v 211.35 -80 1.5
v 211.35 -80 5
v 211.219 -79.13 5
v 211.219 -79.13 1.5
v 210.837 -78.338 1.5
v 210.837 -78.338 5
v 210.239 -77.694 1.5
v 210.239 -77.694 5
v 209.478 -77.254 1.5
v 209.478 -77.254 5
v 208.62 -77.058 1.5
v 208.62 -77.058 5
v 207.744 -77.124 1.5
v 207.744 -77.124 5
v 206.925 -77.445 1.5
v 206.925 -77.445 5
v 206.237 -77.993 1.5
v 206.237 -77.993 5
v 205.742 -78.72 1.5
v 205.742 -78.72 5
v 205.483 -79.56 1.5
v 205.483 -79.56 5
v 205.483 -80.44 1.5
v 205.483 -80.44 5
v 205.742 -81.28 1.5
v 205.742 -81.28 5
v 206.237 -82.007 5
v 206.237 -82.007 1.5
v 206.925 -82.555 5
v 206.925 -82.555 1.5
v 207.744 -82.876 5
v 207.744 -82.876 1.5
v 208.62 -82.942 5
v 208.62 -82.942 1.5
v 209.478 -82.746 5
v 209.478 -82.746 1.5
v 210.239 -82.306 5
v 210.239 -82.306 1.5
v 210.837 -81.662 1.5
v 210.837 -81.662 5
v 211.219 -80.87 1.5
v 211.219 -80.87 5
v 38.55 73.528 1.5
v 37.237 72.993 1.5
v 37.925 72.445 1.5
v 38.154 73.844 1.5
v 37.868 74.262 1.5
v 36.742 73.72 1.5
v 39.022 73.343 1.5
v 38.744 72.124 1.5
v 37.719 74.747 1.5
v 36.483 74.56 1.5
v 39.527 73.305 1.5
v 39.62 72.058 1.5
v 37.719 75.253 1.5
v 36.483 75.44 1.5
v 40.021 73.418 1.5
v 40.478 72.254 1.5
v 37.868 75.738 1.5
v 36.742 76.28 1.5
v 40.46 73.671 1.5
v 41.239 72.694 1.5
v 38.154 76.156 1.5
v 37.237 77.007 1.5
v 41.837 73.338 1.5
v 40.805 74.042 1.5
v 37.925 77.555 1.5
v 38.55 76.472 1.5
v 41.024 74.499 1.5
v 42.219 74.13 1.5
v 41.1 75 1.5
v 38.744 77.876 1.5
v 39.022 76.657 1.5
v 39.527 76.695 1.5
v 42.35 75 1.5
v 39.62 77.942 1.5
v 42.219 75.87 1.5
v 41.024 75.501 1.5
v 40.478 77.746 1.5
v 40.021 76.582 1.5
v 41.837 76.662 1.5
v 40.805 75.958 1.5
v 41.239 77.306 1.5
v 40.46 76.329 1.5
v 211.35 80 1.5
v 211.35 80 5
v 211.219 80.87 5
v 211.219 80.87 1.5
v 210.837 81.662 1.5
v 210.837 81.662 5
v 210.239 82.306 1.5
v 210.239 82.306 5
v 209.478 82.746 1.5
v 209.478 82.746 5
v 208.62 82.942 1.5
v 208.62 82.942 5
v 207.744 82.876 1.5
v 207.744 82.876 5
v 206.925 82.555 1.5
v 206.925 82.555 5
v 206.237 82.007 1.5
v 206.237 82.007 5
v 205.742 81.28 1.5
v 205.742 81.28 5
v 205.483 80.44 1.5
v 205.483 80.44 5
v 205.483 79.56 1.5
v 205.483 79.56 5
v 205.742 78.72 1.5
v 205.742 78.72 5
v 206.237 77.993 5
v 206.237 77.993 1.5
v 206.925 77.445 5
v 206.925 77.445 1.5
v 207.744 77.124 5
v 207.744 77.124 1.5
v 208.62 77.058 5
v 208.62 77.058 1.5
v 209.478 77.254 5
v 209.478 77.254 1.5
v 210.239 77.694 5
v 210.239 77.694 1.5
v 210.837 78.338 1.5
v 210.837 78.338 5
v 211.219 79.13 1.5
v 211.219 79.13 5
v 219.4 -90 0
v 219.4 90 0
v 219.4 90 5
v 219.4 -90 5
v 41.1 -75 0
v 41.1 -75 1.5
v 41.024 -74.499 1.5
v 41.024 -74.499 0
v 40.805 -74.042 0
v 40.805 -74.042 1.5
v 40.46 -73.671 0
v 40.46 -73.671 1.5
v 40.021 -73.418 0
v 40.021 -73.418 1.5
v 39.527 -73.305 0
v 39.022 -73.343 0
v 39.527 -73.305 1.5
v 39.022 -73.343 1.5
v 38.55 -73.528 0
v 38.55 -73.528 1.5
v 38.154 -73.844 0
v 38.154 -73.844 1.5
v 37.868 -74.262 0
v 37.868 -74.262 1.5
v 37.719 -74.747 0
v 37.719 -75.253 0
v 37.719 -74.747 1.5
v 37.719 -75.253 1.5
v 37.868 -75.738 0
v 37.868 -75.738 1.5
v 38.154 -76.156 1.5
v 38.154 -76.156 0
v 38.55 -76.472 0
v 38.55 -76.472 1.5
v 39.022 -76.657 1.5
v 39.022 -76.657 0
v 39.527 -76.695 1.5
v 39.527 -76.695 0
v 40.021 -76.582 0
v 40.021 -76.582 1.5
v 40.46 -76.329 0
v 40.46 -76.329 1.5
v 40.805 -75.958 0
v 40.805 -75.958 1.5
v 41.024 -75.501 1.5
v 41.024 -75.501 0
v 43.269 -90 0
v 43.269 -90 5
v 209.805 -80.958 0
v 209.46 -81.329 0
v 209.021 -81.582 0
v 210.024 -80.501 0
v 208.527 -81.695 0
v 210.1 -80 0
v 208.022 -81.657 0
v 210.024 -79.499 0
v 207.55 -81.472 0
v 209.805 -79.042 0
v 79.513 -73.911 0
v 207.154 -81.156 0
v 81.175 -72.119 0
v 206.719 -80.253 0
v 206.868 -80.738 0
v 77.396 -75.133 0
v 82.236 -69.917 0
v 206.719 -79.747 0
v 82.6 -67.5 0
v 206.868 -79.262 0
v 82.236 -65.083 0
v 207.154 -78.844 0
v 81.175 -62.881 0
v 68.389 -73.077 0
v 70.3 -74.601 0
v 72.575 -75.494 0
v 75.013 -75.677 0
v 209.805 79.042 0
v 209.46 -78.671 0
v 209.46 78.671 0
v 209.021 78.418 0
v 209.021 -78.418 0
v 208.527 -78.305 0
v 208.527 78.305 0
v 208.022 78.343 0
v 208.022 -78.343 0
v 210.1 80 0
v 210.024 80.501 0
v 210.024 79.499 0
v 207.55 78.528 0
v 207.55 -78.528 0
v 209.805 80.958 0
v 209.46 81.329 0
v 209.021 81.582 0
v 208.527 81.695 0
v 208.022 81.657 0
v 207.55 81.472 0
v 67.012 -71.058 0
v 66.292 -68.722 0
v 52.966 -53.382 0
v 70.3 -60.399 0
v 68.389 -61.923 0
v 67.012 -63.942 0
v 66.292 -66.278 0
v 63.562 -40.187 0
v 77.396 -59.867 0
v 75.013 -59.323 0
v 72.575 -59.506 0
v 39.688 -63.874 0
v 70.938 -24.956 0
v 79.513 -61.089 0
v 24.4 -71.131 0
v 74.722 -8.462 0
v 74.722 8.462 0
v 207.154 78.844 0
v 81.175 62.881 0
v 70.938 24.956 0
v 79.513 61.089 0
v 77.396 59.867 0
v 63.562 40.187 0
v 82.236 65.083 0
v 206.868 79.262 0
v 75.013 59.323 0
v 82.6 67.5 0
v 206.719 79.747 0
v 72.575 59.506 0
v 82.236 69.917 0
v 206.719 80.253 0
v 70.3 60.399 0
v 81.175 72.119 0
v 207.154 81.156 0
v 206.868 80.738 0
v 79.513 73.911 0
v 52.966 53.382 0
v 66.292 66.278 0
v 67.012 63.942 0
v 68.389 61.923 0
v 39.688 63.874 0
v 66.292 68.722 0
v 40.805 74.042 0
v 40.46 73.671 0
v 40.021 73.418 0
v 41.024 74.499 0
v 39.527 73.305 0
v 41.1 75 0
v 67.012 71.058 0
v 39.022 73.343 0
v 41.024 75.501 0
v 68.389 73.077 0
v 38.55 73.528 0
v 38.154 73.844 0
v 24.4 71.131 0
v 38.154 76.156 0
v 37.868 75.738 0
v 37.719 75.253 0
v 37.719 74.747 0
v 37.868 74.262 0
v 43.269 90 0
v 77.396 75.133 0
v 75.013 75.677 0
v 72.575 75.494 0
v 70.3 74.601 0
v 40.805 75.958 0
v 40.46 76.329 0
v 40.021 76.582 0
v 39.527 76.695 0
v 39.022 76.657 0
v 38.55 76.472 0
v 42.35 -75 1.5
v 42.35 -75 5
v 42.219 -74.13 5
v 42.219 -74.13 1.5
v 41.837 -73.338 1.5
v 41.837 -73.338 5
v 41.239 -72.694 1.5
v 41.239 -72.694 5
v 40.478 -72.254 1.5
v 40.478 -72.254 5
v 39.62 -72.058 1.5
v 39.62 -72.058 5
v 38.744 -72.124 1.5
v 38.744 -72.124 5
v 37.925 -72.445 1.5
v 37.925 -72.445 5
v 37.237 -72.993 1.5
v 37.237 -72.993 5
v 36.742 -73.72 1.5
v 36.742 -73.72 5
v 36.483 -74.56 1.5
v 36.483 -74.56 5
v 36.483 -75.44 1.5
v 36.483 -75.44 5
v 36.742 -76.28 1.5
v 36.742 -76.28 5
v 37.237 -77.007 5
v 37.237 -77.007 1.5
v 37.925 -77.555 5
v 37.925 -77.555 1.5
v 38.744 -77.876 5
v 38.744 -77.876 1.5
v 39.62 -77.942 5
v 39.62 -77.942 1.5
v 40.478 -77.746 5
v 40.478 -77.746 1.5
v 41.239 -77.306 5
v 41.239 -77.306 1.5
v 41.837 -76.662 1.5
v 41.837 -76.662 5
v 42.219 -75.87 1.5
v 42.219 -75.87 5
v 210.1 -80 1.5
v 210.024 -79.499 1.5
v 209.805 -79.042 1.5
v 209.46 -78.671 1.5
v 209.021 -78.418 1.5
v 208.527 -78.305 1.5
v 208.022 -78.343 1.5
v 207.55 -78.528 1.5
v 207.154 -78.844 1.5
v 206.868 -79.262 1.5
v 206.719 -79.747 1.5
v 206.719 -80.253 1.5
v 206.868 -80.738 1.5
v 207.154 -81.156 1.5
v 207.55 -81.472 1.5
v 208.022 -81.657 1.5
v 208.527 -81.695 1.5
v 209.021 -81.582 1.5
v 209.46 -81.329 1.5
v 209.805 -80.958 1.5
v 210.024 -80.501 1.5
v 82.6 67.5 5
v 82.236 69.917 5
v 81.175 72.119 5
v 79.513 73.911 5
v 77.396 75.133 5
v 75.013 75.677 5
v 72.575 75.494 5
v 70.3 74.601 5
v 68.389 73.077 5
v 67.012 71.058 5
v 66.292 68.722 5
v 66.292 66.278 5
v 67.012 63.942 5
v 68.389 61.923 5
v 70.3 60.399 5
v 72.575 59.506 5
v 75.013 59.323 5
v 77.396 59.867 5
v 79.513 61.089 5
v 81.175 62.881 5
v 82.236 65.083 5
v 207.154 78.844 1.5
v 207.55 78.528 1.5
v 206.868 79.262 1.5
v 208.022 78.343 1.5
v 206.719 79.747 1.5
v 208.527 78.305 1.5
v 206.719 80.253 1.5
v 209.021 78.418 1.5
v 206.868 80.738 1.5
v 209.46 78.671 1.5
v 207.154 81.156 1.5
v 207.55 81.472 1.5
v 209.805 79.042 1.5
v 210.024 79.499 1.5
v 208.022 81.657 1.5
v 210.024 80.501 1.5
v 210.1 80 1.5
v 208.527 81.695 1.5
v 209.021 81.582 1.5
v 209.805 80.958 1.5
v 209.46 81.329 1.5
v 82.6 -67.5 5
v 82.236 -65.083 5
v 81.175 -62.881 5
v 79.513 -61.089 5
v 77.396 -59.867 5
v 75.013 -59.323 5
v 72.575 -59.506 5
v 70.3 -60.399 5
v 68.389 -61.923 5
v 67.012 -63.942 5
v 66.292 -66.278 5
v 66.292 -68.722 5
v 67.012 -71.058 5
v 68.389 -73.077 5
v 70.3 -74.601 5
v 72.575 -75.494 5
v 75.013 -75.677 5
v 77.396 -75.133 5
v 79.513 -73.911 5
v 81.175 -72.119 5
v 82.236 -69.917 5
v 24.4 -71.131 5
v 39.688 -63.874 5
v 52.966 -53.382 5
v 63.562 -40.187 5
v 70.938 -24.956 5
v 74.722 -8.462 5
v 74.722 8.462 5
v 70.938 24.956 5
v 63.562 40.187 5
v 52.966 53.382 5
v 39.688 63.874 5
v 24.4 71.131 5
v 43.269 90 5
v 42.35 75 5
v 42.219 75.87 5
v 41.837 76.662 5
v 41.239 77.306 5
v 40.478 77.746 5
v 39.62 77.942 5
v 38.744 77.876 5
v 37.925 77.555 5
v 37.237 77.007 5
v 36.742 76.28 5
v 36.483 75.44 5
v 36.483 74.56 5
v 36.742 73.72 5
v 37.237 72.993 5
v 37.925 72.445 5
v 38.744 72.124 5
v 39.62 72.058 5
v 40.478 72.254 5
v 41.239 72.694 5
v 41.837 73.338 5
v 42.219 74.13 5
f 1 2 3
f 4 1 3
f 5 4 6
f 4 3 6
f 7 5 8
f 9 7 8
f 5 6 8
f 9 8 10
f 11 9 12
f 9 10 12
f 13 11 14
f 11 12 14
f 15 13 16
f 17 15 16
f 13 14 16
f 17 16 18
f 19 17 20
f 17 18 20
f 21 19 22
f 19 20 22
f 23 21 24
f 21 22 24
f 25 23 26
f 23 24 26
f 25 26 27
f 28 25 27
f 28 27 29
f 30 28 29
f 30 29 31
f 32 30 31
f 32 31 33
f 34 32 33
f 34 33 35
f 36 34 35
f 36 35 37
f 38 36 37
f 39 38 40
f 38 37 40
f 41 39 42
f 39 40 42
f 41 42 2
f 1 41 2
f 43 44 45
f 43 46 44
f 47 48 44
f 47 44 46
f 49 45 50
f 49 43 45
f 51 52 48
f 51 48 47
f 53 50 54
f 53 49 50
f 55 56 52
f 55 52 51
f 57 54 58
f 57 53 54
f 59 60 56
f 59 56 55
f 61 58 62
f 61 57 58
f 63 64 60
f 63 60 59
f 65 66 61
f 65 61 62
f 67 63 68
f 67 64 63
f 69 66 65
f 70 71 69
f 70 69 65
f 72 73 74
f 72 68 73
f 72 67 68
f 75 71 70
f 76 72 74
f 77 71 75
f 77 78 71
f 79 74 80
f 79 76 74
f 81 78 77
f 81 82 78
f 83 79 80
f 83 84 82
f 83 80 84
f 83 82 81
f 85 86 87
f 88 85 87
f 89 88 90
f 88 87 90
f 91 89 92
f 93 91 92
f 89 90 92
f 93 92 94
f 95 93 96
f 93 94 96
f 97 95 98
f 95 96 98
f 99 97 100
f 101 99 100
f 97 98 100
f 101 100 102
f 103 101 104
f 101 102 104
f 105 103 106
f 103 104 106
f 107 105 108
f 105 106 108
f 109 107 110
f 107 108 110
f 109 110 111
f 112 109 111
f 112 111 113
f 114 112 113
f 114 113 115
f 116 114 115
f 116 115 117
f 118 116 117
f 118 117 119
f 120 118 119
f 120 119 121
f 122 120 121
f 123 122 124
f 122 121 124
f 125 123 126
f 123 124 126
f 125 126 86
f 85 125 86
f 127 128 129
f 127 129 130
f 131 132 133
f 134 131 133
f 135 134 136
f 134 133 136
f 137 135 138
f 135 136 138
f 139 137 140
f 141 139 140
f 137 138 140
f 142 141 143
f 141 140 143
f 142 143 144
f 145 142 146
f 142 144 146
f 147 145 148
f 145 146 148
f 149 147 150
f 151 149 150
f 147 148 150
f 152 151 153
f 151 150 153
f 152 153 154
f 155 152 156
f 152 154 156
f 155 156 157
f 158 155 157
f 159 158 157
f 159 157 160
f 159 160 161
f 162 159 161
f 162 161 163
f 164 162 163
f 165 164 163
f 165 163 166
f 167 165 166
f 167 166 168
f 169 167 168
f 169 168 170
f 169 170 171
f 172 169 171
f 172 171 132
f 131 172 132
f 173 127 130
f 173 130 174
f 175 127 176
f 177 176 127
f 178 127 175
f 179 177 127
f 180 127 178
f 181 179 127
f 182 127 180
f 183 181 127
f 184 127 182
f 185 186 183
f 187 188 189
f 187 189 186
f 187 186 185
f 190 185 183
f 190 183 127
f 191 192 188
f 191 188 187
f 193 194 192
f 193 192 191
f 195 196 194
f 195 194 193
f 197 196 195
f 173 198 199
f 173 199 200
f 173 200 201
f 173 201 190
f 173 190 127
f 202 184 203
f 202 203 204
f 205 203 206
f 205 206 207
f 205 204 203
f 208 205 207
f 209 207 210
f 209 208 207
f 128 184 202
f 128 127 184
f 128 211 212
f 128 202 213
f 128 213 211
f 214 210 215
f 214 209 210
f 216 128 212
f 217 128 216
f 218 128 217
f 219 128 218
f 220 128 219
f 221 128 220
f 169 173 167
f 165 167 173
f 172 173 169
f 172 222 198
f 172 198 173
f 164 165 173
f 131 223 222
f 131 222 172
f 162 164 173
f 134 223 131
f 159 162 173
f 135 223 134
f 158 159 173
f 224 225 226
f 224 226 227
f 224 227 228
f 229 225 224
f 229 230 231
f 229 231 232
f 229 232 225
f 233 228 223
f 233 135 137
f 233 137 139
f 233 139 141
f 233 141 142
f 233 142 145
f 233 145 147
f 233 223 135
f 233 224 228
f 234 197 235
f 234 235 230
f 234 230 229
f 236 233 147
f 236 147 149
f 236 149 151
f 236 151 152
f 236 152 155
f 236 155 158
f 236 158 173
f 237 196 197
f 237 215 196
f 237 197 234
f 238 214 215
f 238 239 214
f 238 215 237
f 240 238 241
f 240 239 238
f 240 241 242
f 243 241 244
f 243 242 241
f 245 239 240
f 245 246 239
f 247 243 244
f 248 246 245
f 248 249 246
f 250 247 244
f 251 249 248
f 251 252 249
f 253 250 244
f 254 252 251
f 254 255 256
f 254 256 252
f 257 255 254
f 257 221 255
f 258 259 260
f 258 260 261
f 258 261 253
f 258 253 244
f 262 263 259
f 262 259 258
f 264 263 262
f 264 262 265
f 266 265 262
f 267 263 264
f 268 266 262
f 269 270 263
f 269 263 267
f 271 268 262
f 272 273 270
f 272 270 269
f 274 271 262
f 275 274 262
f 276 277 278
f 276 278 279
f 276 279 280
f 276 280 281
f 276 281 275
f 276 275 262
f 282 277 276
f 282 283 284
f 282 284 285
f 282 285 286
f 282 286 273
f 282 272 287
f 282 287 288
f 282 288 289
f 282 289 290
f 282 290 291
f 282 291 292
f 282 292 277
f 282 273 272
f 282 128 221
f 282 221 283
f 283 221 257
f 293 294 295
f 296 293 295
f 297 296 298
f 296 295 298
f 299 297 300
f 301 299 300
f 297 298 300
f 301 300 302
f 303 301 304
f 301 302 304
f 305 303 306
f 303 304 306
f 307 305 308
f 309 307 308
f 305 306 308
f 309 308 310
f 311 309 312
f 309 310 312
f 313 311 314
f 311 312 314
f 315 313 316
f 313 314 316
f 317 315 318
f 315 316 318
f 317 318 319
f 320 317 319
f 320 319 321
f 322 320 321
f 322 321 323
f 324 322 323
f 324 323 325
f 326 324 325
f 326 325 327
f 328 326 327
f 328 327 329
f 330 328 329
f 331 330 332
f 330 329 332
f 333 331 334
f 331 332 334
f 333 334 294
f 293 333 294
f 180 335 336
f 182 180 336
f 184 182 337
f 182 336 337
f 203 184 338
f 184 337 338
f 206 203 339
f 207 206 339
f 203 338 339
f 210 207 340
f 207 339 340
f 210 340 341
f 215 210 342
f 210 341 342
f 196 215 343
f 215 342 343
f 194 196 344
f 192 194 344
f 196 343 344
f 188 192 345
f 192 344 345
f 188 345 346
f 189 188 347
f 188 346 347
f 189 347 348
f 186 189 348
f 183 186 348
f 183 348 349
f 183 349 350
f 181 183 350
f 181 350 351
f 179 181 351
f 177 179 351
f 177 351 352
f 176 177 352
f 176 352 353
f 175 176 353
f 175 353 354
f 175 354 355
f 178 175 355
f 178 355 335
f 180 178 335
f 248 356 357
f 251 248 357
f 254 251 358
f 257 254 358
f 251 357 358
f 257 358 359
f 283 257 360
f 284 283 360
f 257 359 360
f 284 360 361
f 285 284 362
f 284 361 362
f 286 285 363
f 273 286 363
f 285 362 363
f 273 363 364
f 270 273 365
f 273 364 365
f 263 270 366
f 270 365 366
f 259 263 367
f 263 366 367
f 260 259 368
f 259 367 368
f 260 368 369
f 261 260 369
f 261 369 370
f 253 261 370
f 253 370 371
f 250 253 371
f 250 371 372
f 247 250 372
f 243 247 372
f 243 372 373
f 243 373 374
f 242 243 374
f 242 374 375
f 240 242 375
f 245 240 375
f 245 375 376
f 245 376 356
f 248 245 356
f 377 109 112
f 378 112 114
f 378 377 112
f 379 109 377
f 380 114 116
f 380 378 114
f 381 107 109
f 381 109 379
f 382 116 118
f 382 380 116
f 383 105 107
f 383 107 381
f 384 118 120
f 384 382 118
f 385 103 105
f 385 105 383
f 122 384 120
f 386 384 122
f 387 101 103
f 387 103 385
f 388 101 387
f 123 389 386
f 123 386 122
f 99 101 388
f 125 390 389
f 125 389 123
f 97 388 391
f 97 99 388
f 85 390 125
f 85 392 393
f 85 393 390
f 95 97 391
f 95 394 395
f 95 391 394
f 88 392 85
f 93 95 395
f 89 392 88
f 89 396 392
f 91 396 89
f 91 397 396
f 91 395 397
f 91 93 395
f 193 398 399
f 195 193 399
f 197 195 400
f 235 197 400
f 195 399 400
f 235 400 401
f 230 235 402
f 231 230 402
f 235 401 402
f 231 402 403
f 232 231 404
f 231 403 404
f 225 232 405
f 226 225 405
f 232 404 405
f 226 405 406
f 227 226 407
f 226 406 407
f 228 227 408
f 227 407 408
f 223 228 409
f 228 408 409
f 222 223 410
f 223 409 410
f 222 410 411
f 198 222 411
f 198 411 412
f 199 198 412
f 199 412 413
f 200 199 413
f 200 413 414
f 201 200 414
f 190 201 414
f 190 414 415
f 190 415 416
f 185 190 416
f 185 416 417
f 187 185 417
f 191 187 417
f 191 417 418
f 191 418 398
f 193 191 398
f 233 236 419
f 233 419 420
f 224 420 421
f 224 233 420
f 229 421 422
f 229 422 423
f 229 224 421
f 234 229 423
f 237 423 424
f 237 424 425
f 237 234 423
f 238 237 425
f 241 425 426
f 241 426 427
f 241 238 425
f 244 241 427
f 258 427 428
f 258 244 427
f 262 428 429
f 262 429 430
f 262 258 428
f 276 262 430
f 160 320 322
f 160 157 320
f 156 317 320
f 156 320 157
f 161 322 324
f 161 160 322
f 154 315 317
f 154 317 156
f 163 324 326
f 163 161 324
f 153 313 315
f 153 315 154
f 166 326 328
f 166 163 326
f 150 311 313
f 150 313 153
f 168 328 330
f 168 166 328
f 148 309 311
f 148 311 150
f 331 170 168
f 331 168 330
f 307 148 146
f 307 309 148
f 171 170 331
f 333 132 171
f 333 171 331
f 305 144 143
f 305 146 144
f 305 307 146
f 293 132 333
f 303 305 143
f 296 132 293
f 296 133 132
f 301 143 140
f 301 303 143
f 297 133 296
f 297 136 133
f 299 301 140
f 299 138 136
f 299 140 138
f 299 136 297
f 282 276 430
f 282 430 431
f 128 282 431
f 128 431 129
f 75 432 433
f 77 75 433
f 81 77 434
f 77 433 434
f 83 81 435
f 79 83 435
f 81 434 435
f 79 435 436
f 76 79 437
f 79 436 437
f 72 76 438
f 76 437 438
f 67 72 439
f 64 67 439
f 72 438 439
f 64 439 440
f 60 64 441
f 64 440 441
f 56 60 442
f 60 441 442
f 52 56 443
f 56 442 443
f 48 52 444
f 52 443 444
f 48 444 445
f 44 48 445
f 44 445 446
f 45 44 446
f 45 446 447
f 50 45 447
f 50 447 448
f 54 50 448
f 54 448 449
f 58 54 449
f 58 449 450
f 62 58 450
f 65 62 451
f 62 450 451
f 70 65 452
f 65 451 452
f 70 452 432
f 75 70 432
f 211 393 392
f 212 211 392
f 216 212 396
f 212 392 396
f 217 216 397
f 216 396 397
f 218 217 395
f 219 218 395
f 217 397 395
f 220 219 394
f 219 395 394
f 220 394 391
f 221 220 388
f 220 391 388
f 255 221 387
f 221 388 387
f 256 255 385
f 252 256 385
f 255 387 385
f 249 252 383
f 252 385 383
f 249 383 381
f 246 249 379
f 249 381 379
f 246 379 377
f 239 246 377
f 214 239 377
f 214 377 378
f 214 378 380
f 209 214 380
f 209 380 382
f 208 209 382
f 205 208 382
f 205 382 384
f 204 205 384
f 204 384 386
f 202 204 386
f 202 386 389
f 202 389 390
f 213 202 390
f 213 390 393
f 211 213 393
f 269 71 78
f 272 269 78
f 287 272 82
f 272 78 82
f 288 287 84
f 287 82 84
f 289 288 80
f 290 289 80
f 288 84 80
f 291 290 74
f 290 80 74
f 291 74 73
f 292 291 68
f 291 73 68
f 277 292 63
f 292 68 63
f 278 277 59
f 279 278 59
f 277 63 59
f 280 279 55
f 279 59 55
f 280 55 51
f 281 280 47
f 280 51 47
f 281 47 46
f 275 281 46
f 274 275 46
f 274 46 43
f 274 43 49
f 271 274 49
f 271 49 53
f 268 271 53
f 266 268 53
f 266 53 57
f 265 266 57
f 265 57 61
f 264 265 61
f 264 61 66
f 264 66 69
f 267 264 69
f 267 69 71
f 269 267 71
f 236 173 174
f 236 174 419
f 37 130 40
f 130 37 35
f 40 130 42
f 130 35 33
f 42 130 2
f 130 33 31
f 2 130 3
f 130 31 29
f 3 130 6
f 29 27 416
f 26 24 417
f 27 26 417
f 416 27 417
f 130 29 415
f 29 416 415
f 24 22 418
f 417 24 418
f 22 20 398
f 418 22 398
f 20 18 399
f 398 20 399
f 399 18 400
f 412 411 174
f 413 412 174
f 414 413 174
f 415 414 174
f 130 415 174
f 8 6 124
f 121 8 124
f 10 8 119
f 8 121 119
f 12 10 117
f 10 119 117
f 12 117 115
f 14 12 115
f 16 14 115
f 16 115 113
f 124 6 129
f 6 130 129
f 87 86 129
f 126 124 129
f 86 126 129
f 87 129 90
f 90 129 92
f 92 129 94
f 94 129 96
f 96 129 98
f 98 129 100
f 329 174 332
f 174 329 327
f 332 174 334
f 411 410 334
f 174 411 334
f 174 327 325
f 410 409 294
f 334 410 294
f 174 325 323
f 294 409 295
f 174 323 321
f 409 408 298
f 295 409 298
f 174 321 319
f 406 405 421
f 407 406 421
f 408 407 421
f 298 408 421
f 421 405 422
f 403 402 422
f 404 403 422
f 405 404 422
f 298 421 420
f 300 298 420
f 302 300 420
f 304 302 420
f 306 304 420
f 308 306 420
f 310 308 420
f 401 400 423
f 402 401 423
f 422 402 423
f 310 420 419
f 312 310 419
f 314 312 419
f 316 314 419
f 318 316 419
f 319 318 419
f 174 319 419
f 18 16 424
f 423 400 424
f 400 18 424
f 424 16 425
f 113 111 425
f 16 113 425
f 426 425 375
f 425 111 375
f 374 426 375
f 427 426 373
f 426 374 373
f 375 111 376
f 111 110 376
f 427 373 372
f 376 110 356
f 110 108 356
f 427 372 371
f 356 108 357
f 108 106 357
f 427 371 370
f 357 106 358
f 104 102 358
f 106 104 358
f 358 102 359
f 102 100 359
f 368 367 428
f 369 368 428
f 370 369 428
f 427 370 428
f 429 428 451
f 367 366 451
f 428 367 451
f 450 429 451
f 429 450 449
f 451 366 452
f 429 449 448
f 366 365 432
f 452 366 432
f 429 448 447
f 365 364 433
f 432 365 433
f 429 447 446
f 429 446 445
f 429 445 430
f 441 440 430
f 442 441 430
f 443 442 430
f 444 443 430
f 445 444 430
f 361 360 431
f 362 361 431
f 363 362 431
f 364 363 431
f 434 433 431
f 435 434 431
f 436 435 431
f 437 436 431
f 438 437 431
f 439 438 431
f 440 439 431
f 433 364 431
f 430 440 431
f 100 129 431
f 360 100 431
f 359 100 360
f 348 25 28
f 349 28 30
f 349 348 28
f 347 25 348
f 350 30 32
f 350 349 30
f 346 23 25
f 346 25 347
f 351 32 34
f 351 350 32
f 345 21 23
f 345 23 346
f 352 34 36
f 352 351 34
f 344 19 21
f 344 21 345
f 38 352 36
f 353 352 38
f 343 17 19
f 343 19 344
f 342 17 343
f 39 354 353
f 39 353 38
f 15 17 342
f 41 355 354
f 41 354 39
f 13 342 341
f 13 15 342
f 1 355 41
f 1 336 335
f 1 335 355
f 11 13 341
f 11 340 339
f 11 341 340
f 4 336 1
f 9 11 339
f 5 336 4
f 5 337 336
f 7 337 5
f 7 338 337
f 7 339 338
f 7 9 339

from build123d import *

# Parameters (mm, degrees)
PAD_DEPTH       = 5
SKETCH001_R     = 1.7
SKETCH001_R_2   = 8.2
POCKET_DEPTH    = 5.001
SKETCH002_R     = 2.95
POCKET001_DEPTH = 3.5


with BuildPart() as part:
    # Sketch → Pad (new body)
    with BuildSketch(Plane.XY):
        with BuildLine():
            ThreePointArc((24.4, -71.131428), (75.2, 0), (24.4, 71.131428))
            Line((24.4, 71.131428), (43.268572, 90))
            Line((43.268572, 90), (219.4, 90))
            Line((219.4, 90), (219.4, -90))
            Line((219.4, -90), (43.268572, -90))
            Line((43.268572, -90), (24.4, -71.131428))
        make_face()
    extrude(amount=PAD_DEPTH)

    # Sketch001 (on Face8 of Pad) → Pocket (cut, through all)
    with BuildSketch(Plane.XY.offset(5)):
        with Locations((39.4, 75)):
            Circle(SKETCH001_R)
        with Locations((39.4, -75)):
            Circle(SKETCH001_R)
        with Locations((208.4, -80)):
            Circle(SKETCH001_R)
        with Locations((208.4, 80)):
            Circle(SKETCH001_R)
        with Locations((74.4, 67.5)):
            Circle(SKETCH001_R_2)
        with Locations((74.4, -67.5)):
            Circle(SKETCH001_R_2)
    extrude(amount=-POCKET_DEPTH, mode=Mode.SUBTRACT)

    # Sketch002 (on Face5 of Pocket) → Pocket001 (cut)
    with BuildSketch(Plane.XY.offset(5)):
        with Locations((39.4, -75)):
            Circle(SKETCH002_R)
        with Locations((208.4, -80)):
            Circle(SKETCH002_R)
        with Locations((39.4, 75)):
            Circle(SKETCH002_R)
        with Locations((208.4, 80)):
            Circle(SKETCH002_R)
    extrude(amount=-POCKET001_DEPTH, mode=Mode.SUBTRACT)


solid = part.part
